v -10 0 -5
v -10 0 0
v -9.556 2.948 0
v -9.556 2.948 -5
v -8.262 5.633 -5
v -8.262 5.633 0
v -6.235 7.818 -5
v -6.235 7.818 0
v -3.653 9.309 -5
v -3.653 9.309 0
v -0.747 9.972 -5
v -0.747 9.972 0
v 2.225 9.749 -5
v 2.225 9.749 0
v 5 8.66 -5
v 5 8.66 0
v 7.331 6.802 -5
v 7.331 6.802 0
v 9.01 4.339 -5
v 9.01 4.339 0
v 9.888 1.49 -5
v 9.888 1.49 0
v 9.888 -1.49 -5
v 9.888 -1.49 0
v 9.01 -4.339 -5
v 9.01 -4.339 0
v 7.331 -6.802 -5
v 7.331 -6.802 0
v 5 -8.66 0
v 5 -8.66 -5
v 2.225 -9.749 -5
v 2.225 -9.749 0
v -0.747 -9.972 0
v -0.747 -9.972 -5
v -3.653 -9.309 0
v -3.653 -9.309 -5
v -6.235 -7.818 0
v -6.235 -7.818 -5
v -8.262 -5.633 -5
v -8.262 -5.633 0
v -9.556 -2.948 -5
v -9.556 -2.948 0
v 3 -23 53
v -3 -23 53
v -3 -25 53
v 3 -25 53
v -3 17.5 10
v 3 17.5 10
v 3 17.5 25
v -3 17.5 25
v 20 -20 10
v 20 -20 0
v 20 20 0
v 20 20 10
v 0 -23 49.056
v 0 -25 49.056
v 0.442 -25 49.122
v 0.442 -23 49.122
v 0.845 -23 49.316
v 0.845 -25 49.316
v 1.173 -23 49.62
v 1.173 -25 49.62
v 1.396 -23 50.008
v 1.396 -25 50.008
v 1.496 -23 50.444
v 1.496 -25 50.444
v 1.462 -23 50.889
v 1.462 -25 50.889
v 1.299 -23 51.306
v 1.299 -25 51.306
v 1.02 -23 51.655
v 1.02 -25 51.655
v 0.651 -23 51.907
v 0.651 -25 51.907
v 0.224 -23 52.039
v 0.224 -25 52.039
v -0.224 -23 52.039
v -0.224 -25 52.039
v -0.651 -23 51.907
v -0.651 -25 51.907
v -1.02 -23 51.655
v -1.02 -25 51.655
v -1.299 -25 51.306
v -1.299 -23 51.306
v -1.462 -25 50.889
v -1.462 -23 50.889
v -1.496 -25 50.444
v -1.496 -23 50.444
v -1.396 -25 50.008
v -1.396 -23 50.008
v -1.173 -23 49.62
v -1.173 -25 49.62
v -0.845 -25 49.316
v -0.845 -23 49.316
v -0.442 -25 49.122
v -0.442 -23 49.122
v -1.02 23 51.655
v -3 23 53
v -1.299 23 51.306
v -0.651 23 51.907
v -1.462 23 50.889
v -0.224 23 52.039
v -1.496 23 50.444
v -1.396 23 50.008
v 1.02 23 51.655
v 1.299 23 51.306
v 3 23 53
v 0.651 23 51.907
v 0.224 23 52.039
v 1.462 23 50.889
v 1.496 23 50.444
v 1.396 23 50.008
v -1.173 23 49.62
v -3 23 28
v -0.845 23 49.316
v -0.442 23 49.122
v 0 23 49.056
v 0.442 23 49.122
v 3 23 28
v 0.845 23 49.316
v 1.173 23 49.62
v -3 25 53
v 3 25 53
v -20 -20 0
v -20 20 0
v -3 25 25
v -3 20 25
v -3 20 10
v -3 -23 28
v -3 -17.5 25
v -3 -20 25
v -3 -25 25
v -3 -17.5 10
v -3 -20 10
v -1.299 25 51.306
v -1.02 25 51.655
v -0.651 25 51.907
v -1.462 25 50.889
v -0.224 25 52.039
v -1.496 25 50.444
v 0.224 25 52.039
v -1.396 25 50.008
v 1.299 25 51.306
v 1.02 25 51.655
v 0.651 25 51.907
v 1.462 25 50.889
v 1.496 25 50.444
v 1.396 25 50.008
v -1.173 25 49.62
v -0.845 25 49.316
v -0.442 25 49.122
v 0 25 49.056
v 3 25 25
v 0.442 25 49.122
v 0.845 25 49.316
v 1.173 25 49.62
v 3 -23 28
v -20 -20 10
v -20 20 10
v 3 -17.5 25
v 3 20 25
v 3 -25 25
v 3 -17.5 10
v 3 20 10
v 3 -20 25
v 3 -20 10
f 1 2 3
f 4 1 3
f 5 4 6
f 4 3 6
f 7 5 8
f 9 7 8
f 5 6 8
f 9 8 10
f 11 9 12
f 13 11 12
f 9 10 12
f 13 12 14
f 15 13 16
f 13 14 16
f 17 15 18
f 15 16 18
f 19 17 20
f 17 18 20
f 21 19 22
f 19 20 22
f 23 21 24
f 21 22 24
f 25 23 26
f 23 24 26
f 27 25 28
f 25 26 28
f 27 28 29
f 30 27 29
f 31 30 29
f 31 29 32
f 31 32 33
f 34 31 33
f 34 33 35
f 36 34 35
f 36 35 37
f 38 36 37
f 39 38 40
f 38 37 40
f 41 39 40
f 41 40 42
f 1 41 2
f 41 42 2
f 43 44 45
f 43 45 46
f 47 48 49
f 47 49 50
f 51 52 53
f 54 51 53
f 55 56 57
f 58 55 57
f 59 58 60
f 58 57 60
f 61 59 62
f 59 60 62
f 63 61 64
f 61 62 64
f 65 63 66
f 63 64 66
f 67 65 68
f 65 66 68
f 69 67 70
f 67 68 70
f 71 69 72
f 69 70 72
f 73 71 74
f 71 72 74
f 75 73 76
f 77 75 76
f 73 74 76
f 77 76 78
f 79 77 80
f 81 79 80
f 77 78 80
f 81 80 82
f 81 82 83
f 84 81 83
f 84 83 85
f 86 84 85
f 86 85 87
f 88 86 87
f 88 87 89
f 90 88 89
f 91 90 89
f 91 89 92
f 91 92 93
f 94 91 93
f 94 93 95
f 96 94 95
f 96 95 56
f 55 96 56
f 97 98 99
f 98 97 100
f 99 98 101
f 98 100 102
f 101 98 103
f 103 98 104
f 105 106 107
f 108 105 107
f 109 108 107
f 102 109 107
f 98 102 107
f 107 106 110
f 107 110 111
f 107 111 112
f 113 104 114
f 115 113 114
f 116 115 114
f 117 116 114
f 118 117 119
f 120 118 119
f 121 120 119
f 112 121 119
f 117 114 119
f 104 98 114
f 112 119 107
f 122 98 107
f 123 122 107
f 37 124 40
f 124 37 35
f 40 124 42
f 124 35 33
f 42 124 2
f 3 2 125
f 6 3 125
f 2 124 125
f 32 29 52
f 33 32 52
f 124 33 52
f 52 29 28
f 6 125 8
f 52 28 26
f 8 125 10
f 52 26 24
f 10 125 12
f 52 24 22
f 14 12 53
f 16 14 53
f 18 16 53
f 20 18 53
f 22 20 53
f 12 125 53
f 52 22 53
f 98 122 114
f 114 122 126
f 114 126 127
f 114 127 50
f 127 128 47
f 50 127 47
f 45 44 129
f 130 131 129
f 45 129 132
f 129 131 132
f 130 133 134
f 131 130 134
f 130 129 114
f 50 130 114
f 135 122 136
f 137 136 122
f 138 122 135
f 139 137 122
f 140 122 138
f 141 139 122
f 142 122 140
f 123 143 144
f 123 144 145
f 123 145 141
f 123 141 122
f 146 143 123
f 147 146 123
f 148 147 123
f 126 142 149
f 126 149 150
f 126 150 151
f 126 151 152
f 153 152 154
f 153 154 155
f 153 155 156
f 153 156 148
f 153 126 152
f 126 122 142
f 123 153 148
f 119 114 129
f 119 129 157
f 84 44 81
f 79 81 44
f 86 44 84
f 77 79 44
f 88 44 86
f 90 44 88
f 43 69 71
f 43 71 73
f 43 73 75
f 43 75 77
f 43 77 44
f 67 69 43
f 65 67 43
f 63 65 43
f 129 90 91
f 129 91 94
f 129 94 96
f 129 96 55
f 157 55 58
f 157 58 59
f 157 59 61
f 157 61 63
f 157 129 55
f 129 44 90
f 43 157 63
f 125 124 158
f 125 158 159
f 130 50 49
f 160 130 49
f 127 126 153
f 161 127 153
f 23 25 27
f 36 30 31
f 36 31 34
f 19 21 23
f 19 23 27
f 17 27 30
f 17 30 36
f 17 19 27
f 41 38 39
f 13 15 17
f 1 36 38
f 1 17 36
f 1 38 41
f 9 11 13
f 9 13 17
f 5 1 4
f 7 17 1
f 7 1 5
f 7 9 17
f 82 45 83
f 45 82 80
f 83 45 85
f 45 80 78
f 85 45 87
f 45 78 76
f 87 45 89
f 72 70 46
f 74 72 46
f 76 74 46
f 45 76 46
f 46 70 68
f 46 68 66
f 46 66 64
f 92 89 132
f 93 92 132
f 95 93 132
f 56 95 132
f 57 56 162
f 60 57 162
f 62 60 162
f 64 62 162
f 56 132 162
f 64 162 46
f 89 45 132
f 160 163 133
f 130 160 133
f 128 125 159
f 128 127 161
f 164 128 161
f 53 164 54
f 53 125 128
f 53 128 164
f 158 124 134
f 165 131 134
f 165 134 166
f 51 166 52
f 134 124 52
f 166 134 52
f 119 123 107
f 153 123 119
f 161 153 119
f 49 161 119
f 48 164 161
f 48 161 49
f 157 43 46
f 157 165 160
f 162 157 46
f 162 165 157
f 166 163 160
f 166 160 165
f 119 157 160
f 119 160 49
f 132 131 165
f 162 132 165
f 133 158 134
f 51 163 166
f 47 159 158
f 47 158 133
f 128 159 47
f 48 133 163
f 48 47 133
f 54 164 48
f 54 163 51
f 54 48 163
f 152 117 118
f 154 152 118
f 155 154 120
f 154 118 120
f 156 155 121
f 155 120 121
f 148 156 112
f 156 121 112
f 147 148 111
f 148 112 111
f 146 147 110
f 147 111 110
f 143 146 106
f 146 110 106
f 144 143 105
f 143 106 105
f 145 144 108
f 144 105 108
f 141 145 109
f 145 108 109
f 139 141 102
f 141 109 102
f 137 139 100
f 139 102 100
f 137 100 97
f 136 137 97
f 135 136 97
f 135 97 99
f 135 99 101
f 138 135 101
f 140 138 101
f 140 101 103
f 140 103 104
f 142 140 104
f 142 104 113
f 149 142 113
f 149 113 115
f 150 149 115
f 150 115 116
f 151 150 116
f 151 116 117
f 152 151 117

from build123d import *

# Parameters (mm, degrees)
SKETCH1_W           = 40
SKETCH1_H           = 40
BOSS_EXTRUDE1_DEPTH = 10
BOSS_EXTRUDE2_DEPTH = 15
SKETCH6_W           = 6
SKETCH6_H           = 50
BOSS_EXTRUDE4_DEPTH = 3
SKETCH7_W           = 6
SKETCH7_H           = 2
BOSS_EXTRUDE5_DEPTH = 25
SKETCH8_R           = 1.5
CUT_EXTRUDE1_DEPTH  = 65
SKETCH10_R          = 10
BOSS_EXTRUDE7_DEPTH = 5


with BuildPart() as part:
    # Sketch1 → Boss-Extrude1 (new body)
    with BuildSketch(Plane.XY):
        Rectangle(SKETCH1_W, SKETCH1_H)
    extrude(amount=BOSS_EXTRUDE1_DEPTH)

    # Sketch2 → Boss-Extrude2 (add)
    with BuildSketch(Plane.XY.offset(10)):
        Polygon((0, -20), (3, -20), (3, -17.5), (-3, -17.5), (-3, -20), align=None)
    boss_extrude2 = extrude(amount=BOSS_EXTRUDE2_DEPTH)

    # Mirror1: Boss-Extrude2 across plane
    add(boss_extrude2.mirror(Plane.ZX))

    # Sketch6 → Boss-Extrude4 (add)
    with BuildSketch(Plane.XY.offset(25)):
        Rectangle(SKETCH6_W, SKETCH6_H)
    extrude(amount=BOSS_EXTRUDE4_DEPTH)

    # Sketch7 → Boss-Extrude5 (add)
    with BuildSketch(Plane.XY.offset(28)):
        with Locations((0, -24)):
            Rectangle(SKETCH7_W, SKETCH7_H)
    boss_extrude5 = extrude(amount=BOSS_EXTRUDE5_DEPTH)

    # Mirror2: Boss-Extrude5 across plane
    add(boss_extrude5.mirror(Plane.ZX))

    # Sketch8 → Cut-Extrude1 (cut)
    with BuildSketch(Plane.XZ.offset(25)):
        with Locations(Location((0, 50.555661978, 0), (0, 0, 270))):
            Circle(SKETCH8_R)
    extrude(amount=-CUT_EXTRUDE1_DEPTH, mode=Mode.SUBTRACT)

    # Sketch10 → Boss-Extrude7 (add)
    with BuildSketch(Plane(origin=(0, 0, 0), x_dir=(-1, 0, 0), z_dir=(0, 0, -1))):
        Circle(SKETCH10_R)
    extrude(amount=BOSS_EXTRUDE7_DEPTH)


solid = part.part
